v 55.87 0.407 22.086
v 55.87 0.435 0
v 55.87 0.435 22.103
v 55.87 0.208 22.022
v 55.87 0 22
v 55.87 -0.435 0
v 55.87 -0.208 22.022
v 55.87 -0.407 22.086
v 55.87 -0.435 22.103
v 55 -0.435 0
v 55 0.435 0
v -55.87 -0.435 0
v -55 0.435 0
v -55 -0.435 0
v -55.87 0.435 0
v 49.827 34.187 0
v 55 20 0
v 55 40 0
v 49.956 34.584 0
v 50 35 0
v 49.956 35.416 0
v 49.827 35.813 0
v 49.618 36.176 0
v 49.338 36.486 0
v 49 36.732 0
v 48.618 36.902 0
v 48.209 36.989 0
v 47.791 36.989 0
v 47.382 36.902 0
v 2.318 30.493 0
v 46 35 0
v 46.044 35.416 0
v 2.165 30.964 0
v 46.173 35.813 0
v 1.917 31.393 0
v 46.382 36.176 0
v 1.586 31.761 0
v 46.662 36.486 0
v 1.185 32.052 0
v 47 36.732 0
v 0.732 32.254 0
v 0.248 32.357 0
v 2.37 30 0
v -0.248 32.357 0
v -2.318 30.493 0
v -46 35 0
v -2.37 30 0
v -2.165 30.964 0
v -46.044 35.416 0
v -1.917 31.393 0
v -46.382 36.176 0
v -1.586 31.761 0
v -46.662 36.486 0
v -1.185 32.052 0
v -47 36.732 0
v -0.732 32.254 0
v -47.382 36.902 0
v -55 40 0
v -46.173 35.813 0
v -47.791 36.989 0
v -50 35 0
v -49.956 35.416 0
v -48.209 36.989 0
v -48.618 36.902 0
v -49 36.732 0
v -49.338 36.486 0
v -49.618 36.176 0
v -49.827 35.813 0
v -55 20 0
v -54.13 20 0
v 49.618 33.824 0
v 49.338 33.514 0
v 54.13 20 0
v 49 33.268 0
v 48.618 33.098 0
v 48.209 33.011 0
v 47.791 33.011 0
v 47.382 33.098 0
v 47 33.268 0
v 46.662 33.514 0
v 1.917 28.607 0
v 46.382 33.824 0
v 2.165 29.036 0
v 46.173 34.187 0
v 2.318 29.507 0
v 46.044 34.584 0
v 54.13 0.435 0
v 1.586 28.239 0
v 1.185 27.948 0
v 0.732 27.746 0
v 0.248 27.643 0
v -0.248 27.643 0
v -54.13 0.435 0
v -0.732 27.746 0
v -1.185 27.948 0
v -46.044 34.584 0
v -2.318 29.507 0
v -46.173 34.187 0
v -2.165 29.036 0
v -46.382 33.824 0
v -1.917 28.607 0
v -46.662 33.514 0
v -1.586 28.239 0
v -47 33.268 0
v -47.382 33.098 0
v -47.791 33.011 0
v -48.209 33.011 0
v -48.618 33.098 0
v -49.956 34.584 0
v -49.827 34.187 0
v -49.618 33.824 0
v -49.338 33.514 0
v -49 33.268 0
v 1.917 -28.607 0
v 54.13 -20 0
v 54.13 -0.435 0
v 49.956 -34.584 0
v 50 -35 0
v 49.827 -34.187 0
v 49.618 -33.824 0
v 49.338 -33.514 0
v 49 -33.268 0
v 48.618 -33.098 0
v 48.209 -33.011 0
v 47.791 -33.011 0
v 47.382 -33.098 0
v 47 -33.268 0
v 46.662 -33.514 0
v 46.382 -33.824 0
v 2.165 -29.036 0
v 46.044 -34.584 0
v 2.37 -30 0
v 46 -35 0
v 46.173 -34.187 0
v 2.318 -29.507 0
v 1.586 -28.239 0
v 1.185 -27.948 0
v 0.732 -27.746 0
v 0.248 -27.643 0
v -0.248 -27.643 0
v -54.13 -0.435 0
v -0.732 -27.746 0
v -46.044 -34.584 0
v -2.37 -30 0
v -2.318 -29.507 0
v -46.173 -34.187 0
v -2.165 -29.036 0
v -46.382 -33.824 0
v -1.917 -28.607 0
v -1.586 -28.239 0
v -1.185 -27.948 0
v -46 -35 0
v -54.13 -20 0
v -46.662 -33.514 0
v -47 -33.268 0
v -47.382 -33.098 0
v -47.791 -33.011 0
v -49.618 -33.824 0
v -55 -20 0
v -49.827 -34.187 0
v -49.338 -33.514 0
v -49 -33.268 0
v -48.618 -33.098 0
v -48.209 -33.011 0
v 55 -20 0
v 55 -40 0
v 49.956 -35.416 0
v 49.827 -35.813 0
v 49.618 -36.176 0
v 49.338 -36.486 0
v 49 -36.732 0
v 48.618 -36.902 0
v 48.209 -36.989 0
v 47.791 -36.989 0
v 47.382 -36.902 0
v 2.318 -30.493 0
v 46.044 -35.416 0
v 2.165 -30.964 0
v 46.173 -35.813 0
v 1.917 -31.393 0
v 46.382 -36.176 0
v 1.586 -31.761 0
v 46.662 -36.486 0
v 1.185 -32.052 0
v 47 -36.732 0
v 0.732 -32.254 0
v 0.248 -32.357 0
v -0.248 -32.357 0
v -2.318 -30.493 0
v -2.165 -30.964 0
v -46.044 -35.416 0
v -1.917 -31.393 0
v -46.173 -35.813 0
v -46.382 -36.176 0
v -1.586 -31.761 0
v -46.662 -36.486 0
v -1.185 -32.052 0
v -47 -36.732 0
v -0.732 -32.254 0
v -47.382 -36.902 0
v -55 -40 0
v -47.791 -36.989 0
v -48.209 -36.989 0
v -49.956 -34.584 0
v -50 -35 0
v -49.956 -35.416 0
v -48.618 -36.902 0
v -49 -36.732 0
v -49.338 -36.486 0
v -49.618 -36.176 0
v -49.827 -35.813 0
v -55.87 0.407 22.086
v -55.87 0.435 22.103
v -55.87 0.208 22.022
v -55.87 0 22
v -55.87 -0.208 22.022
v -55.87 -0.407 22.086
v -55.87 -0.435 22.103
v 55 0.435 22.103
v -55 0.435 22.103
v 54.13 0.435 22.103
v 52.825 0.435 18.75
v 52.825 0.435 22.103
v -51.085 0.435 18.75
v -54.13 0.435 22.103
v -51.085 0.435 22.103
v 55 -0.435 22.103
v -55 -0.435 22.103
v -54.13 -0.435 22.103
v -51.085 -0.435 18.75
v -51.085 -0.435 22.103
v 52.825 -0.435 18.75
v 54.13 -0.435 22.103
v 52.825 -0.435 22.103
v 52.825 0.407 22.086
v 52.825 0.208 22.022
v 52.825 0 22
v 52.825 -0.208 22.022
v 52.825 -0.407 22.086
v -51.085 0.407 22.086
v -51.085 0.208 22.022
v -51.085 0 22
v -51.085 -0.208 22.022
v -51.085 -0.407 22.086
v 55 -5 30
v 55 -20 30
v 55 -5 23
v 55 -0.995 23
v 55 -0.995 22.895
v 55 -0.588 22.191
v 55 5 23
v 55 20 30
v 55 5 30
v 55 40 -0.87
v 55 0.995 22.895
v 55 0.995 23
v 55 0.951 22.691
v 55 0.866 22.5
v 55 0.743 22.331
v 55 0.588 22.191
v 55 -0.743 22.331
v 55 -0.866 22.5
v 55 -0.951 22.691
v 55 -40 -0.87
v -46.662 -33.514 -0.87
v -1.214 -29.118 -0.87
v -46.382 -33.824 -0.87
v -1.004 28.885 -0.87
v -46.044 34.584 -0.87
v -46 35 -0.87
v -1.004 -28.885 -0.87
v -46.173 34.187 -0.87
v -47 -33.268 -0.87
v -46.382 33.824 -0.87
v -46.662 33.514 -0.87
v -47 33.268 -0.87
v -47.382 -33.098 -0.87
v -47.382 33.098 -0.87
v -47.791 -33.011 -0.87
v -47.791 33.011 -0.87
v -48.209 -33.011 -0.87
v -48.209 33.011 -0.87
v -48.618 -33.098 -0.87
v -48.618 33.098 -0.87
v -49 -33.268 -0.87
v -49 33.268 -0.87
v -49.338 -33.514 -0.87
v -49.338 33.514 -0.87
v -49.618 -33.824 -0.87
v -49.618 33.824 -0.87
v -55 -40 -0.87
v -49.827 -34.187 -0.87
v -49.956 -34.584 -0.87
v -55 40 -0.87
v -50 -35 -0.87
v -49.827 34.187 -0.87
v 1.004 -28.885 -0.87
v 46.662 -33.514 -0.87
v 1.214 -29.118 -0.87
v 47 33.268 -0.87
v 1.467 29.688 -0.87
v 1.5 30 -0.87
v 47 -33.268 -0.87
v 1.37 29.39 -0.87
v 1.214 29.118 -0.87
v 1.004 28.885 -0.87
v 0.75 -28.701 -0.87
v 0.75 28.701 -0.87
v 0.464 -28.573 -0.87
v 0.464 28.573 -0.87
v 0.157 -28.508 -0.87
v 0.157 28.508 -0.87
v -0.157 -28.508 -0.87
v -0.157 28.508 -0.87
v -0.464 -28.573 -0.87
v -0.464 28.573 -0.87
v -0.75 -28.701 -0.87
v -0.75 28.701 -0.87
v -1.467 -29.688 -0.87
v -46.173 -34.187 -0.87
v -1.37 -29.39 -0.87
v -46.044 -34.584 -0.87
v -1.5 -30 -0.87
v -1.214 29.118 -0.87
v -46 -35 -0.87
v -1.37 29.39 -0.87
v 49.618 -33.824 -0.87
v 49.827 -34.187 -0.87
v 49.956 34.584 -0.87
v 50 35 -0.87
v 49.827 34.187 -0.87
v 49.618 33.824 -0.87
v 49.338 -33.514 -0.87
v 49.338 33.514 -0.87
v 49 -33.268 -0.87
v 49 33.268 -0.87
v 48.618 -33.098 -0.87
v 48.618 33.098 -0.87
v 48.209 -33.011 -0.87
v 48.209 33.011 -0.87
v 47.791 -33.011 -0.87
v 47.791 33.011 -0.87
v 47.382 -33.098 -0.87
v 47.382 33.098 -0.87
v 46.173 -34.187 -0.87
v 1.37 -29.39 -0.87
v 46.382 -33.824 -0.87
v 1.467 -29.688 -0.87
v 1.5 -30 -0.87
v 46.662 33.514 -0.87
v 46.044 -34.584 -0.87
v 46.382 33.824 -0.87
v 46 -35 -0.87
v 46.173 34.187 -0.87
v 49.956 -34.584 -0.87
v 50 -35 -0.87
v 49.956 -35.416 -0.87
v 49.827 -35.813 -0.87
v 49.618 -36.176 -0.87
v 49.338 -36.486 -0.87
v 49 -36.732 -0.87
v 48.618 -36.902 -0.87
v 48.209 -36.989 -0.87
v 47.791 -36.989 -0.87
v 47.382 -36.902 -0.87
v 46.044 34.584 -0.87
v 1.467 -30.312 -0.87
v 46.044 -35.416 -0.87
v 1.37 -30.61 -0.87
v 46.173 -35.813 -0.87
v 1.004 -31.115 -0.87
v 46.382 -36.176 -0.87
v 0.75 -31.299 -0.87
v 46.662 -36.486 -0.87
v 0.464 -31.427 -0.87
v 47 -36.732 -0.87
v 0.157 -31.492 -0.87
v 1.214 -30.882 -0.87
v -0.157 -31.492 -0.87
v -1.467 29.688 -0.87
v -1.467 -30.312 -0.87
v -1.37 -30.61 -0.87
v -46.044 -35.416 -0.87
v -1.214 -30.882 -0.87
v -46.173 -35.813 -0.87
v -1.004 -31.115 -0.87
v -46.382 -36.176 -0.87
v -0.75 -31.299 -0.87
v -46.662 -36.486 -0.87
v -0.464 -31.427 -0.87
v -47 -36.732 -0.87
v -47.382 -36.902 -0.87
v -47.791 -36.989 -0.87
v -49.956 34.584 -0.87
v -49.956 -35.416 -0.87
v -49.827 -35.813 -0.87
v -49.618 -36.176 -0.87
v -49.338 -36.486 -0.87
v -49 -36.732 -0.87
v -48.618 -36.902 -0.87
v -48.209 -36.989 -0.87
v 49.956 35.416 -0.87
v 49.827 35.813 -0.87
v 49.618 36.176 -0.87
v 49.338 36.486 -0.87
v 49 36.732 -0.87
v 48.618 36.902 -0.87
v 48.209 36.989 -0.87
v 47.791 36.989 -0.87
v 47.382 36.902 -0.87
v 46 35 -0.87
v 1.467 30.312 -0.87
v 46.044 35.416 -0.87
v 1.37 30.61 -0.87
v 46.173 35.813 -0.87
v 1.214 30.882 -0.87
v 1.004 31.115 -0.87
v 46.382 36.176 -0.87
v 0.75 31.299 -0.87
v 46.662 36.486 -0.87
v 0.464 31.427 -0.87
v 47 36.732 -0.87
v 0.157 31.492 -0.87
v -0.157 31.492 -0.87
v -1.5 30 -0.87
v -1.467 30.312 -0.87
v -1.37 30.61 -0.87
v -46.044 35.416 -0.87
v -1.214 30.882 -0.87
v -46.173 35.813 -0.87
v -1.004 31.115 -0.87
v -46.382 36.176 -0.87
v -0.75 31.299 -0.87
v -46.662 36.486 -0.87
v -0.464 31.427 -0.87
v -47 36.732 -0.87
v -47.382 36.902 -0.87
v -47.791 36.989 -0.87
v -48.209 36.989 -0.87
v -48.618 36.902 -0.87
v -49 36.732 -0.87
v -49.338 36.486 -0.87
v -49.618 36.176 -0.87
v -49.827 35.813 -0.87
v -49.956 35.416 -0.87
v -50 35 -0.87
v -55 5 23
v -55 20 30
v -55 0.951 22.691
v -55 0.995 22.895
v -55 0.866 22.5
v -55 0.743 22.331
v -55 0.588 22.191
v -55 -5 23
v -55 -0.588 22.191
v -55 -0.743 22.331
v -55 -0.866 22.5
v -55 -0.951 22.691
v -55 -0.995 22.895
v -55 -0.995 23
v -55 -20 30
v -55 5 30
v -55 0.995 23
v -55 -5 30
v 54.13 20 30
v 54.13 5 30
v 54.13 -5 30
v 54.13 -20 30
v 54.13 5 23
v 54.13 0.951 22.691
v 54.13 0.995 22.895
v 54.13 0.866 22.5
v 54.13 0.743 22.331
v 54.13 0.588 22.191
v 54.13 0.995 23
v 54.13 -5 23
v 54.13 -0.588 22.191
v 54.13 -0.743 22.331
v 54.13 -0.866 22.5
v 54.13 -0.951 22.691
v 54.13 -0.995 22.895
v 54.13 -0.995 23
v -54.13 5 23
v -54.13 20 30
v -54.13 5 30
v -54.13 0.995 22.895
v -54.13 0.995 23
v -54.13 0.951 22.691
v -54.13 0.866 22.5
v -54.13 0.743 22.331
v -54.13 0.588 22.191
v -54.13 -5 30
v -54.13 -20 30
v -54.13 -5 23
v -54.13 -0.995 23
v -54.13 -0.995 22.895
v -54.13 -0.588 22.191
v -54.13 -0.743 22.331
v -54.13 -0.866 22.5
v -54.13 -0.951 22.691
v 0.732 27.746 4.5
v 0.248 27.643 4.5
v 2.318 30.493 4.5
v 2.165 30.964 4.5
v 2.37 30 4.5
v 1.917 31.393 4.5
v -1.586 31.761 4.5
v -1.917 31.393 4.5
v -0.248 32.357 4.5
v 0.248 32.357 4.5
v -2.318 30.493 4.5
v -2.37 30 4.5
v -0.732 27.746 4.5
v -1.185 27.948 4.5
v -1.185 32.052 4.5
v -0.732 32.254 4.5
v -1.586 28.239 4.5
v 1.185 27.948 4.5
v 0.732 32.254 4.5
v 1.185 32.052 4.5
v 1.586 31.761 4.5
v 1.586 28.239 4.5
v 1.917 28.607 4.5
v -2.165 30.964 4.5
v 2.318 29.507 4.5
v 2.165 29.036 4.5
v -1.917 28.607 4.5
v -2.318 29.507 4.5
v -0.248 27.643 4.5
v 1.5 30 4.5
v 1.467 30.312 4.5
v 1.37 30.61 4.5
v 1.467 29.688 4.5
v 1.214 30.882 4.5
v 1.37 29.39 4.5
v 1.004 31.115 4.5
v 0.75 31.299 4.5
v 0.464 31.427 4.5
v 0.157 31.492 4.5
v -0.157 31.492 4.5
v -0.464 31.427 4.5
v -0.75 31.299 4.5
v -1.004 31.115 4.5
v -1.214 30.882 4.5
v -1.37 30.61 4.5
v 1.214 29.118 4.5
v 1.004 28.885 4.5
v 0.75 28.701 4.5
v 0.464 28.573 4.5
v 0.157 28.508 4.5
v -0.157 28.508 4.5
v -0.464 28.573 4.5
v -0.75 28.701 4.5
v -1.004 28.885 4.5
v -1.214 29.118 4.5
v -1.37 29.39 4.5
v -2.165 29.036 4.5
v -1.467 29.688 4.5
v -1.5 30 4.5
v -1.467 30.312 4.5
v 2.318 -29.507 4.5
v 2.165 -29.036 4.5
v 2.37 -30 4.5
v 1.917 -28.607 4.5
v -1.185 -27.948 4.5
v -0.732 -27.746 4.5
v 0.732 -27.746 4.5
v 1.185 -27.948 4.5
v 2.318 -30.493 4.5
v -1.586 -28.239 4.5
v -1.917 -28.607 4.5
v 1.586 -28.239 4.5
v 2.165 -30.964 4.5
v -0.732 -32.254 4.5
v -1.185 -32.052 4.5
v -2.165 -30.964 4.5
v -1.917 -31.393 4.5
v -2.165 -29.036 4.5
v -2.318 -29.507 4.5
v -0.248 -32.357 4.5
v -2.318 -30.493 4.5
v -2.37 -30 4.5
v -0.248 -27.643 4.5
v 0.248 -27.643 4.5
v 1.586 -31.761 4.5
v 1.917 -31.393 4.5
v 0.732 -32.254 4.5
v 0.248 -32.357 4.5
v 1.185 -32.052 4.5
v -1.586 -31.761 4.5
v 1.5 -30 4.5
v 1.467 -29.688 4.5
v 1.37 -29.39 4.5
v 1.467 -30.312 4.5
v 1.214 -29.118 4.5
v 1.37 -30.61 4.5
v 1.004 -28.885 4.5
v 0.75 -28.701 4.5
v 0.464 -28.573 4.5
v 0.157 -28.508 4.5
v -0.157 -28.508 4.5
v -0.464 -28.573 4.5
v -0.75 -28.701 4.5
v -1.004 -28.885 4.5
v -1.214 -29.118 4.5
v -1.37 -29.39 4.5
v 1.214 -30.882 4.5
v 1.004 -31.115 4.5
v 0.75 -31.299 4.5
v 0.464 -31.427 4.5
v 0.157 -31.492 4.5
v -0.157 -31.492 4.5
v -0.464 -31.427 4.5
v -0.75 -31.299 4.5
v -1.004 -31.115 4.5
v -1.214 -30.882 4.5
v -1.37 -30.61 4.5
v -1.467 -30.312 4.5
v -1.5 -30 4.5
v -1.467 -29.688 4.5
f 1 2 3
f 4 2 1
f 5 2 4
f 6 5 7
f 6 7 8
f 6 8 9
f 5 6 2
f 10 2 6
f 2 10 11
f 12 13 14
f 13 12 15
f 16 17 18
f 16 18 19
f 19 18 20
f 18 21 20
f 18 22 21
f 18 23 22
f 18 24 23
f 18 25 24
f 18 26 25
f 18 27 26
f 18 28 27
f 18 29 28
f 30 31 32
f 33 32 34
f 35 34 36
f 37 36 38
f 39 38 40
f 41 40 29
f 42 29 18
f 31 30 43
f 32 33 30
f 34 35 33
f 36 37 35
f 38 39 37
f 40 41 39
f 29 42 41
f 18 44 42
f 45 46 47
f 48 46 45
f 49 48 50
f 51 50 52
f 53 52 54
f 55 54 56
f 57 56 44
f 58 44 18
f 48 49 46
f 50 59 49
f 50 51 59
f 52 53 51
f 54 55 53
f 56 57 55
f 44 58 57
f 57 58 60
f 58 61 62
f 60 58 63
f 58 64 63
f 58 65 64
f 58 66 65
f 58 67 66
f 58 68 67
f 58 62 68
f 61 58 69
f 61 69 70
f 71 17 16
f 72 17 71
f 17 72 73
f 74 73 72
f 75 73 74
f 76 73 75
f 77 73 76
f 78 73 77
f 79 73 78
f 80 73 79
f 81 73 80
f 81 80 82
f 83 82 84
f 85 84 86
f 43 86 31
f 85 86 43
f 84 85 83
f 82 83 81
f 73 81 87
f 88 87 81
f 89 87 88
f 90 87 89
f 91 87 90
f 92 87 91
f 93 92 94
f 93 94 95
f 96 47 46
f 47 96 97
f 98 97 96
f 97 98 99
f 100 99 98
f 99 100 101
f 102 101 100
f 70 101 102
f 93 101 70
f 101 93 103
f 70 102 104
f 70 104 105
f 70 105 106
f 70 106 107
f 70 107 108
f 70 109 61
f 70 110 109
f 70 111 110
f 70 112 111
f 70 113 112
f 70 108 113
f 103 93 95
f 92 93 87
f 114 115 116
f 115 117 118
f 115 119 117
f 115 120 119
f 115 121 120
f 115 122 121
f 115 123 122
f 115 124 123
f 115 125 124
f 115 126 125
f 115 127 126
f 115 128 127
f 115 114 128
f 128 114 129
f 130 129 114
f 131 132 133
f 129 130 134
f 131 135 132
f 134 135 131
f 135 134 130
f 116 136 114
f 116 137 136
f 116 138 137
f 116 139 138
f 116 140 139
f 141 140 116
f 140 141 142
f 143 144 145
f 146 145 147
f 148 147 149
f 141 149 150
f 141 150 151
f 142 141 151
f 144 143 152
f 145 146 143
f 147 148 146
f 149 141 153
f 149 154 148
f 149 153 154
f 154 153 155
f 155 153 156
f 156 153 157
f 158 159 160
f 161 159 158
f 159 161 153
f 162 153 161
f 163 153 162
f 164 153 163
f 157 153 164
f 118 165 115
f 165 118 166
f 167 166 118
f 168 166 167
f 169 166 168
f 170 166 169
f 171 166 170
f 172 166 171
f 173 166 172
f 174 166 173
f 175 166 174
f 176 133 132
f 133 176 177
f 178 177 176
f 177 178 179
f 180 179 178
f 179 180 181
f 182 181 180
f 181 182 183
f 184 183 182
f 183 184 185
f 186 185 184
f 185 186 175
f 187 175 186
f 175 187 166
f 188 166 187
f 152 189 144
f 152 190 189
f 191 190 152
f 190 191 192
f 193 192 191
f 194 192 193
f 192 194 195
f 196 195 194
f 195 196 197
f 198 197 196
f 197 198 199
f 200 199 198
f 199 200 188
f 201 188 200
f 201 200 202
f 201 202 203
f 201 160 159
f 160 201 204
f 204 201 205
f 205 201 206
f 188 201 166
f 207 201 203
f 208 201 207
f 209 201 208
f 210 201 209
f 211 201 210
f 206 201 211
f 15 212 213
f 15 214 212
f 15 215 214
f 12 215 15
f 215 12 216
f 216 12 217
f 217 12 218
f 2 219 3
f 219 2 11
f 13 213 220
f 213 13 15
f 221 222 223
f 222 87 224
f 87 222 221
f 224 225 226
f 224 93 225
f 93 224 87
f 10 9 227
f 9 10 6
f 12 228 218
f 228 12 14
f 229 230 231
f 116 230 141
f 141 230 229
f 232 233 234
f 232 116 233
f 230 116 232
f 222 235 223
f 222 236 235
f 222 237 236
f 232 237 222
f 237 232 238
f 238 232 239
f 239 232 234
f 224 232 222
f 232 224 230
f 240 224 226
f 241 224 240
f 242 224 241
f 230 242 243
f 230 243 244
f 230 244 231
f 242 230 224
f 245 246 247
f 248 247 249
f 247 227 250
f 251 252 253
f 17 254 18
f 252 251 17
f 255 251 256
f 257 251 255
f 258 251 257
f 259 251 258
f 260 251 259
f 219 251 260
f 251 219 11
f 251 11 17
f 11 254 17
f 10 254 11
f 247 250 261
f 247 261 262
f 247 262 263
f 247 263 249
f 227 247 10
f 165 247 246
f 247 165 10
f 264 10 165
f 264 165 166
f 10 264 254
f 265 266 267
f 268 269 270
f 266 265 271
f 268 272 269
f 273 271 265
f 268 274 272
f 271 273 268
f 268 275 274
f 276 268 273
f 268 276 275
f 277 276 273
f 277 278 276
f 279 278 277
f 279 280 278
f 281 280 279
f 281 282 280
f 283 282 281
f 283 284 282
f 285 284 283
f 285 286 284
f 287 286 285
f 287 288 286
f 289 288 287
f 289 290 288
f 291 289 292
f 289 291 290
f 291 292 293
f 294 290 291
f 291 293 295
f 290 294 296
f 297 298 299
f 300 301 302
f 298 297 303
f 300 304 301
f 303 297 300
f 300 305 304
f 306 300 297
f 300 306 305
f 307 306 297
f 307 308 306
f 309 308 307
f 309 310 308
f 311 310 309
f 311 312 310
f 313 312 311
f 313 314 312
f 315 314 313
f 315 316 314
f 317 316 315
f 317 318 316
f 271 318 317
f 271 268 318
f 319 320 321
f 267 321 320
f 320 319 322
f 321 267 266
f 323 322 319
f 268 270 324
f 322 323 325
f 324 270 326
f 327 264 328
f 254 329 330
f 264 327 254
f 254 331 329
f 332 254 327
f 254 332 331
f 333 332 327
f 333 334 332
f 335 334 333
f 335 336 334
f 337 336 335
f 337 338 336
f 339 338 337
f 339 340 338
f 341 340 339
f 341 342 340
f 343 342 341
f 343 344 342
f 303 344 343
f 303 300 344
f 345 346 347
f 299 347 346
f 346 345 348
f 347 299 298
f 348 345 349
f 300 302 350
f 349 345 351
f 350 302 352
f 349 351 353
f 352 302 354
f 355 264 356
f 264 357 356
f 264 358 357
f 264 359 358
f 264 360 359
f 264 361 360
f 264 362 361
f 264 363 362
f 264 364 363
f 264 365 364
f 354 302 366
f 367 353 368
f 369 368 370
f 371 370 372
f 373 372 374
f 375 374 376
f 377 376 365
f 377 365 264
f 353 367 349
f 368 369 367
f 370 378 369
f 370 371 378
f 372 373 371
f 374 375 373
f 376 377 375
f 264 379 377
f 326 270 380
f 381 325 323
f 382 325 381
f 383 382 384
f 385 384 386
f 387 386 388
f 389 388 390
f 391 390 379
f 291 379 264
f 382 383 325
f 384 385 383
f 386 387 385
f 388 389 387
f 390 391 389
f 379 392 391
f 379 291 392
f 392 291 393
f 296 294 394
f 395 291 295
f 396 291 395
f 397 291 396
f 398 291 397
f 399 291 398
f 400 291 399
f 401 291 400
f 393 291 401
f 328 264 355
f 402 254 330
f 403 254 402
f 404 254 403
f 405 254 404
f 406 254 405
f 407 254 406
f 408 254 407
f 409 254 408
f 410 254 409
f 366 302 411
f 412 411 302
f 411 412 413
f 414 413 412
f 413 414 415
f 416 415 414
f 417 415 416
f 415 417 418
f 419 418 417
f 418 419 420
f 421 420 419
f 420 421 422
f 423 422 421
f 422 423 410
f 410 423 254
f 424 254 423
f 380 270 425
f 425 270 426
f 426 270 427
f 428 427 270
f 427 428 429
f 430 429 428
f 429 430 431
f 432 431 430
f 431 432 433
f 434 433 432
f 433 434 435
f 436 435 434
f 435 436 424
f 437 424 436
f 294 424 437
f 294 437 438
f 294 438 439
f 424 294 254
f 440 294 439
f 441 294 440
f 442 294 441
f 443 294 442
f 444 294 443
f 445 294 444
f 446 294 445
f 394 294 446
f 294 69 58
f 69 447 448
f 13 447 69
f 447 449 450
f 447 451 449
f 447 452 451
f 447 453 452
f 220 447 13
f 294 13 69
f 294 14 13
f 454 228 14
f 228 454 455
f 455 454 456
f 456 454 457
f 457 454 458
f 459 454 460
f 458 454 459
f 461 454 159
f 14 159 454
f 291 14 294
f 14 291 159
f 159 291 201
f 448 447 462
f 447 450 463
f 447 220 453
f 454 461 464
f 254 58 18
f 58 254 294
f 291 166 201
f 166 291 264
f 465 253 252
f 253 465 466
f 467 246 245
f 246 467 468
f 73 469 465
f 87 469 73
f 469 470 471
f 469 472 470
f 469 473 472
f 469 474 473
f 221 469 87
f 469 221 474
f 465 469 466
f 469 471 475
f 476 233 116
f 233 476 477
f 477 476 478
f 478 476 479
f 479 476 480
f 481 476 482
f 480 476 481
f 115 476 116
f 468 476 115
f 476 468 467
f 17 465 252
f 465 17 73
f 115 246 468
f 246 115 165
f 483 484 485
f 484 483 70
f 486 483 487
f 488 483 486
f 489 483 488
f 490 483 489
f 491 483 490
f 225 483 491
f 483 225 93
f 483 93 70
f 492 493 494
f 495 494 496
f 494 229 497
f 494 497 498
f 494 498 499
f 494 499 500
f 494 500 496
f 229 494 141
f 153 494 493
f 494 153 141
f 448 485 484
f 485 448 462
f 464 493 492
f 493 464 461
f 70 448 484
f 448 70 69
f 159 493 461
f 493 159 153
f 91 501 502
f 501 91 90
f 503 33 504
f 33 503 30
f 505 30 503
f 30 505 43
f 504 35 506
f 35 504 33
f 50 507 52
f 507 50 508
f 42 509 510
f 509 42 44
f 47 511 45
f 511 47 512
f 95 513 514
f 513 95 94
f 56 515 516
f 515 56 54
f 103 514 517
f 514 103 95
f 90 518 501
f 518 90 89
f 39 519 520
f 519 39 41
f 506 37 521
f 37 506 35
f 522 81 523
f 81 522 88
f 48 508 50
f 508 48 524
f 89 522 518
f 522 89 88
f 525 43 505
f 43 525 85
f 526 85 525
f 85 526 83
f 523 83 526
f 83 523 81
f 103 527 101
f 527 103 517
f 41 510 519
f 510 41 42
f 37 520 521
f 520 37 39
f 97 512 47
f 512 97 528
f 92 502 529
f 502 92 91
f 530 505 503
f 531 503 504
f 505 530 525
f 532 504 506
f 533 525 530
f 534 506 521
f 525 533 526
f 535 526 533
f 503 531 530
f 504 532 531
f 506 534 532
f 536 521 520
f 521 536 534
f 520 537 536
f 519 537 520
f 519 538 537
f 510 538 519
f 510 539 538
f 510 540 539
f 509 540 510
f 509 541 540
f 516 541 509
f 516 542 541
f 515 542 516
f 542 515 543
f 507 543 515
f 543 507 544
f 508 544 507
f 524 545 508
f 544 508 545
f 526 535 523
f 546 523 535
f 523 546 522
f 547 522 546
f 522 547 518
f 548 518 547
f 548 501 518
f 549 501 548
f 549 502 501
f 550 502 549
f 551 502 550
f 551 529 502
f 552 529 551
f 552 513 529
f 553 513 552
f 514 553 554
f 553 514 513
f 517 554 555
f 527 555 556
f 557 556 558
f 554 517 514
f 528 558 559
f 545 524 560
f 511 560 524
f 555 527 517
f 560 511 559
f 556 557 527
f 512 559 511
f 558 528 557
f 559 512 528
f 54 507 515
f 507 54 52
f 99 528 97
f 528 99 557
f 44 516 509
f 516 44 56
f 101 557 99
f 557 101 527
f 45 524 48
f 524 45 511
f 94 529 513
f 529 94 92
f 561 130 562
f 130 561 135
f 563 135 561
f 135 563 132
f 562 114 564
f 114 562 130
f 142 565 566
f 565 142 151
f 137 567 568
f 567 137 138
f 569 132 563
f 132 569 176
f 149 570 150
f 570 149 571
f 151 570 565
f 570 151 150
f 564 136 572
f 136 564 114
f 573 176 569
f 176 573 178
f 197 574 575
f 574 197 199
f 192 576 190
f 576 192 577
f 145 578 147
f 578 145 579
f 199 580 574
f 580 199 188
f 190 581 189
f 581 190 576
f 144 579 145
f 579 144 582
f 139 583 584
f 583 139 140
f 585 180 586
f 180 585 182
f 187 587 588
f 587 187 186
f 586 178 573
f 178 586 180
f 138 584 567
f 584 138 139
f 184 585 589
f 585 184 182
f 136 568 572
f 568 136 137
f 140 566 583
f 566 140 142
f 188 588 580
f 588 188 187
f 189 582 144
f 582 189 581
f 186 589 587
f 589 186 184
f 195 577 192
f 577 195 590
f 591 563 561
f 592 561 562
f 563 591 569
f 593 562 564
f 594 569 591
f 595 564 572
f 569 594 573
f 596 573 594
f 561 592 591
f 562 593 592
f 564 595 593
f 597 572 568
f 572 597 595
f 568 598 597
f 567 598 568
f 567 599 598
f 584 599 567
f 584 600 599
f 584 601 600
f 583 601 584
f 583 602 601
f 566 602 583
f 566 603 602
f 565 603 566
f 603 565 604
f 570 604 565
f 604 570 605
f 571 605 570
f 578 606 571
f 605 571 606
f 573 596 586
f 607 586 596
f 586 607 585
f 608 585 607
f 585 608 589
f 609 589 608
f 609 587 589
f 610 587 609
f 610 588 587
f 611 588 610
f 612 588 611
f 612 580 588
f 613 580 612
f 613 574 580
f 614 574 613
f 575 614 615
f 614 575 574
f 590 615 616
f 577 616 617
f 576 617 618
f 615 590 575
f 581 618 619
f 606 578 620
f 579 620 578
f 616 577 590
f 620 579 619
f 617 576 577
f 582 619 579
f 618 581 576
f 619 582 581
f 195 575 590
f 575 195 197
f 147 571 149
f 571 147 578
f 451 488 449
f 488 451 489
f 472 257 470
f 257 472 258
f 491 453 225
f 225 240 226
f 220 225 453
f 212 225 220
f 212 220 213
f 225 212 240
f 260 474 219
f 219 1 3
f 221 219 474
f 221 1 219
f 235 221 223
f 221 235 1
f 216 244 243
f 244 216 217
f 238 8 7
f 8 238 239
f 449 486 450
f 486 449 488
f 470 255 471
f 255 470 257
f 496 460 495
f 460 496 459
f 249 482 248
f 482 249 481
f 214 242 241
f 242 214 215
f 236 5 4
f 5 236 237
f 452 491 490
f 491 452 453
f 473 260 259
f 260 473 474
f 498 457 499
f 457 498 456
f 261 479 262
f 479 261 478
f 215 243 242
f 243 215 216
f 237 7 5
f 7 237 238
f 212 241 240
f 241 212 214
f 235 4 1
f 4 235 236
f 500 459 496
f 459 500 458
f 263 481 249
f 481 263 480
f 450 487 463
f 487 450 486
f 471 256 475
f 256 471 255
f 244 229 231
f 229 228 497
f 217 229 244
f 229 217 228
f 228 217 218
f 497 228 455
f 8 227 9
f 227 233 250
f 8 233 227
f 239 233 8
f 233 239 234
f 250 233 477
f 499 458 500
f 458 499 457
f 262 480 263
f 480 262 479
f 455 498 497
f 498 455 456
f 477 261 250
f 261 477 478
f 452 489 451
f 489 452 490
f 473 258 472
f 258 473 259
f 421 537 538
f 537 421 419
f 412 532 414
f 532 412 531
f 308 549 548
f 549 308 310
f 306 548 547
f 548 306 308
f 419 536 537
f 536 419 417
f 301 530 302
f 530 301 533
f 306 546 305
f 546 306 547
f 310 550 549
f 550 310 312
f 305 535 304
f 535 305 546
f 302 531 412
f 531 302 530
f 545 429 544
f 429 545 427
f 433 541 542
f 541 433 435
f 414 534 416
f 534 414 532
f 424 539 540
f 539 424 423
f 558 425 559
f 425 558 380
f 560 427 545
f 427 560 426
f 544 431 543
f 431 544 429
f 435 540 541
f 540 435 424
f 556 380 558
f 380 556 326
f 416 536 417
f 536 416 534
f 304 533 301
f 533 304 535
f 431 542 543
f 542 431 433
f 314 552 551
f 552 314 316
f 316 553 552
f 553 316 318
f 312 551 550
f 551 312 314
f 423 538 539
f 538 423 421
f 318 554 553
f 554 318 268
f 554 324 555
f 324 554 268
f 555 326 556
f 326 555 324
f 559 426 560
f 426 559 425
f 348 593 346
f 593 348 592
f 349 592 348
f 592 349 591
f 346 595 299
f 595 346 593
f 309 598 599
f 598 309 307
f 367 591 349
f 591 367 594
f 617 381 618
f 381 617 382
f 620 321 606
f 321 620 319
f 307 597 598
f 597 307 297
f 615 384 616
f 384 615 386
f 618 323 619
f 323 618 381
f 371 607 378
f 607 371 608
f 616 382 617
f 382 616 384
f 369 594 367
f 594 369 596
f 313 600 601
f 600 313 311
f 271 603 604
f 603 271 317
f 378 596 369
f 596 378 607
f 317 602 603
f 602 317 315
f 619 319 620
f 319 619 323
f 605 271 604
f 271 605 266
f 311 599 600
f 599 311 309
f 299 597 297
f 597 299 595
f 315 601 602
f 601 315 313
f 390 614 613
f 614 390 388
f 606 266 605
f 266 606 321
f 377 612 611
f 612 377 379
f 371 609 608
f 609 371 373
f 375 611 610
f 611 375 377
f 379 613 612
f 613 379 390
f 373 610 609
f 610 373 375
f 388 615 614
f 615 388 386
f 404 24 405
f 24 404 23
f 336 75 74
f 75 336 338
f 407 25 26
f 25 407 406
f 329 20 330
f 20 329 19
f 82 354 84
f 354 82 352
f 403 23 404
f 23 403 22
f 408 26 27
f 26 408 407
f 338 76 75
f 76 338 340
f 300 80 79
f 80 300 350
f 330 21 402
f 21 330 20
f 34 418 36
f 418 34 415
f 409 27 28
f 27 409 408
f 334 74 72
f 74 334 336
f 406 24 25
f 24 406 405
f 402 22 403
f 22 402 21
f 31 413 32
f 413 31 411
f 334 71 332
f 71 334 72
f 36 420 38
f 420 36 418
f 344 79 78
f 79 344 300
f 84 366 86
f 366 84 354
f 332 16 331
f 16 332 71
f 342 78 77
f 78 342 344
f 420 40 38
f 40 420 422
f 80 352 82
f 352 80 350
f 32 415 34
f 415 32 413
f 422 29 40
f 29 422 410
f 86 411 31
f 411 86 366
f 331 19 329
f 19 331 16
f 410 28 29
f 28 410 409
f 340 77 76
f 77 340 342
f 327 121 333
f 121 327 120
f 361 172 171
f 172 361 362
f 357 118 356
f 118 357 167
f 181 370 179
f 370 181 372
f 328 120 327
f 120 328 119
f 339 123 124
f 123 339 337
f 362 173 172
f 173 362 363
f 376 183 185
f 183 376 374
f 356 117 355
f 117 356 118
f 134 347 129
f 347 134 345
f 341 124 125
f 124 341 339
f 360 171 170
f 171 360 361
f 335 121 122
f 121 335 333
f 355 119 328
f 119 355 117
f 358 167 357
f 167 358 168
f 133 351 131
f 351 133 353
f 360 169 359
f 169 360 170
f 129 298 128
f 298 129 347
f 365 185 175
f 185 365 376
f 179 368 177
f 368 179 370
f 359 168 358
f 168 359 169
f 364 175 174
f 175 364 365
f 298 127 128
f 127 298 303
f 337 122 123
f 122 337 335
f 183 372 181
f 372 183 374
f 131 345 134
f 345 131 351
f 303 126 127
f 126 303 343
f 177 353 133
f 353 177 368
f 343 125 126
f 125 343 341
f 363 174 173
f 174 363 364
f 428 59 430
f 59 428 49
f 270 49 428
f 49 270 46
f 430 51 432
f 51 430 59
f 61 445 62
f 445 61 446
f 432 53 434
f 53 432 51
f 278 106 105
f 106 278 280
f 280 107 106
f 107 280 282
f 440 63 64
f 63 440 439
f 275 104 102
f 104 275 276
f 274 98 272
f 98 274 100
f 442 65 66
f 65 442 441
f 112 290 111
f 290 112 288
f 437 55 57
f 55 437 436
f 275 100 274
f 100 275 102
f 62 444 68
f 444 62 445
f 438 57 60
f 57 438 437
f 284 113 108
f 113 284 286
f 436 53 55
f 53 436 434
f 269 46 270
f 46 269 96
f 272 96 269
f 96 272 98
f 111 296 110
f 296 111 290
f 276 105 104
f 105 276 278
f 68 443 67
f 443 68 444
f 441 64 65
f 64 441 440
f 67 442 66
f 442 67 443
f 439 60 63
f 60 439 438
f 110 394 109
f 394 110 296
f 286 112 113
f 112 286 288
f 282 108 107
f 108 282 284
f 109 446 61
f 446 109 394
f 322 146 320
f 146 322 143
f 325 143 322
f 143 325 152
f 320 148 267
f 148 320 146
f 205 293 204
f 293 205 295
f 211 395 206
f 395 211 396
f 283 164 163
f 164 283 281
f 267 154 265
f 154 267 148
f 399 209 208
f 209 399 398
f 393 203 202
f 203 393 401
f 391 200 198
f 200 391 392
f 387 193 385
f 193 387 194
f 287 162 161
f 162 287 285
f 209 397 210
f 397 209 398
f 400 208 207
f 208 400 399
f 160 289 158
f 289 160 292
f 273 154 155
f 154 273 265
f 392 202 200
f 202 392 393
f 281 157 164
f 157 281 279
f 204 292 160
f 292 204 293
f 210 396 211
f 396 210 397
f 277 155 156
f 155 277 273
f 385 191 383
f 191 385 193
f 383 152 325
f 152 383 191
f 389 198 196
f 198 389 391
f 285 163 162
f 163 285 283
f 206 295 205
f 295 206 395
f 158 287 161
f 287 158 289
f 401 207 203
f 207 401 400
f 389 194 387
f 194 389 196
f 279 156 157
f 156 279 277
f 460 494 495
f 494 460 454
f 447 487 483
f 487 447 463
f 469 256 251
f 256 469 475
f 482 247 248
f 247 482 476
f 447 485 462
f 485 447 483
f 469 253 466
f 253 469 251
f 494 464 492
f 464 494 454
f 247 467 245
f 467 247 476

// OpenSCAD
$fn = 30;

module base(length, width, height, thick)
{
	difference() {
		union() {
			translate([-width/2, -length/2, -thick]) cube([width,length, thick]);
			translate([width/2-thick, -length/4, 0]) cube([thick, length/2,height]);
            translate([-width/2, -length/4, 0]) cube([thick, length/2,height]);
            // Support
            difference(){
                color("green")
                translate([0,0,(height-height/4)/2])
                cube([width+2*thick,thick,height-height/4], true);
                translate([thick,0,(height-height/4)])
                cube([width - 7*thick, 2*thick,height/4], true);
            }
			// calibration posts
			color("blue") translate([0, length/2-10, 0]) cylinder(h=4.5, r=thick +1.5 , center=false);
			color("blue") translate([0, -length/2+10, 0]) cylinder(h=4.5, r=thick +1.5 , center=false);
		}
		// hole for the bucket rod
		color("red") translate([0, 0, height-7]) rotate(a=90, v=[0,1 ,0 ]) cylinder(h=width+5, r=1, center=true);
		// calibration posts holes
		color("red") translate([0, length/2-10, -3]) cylinder(h=9, r=1.5, center=false);
		color("red") translate([0, -length/2+10, -3]) cylinder(h=9, r=1.5, center=false);
		// mounting holes
		color("red") translate([width/2-7, length/2-5, -3]) cylinder(h=4, r=2, center=false);
		color("red") translate([width/2-7, -length/2+5, -3]) cylinder(h=4, r=2, center=false);
		color("red") translate([-width/2+7, length/2-5, -3]) cylinder(h=4, r=2, center=false);
		color("red") translate([-width/2+7, -length/2+5, -3]) cylinder(h=4, r=2, center=false);
		// cut to top off top
		color("red") translate([0, 0, height-3]) cube([width+2,10,8],center = true);
	}
}


base(80,110,30,.87);
